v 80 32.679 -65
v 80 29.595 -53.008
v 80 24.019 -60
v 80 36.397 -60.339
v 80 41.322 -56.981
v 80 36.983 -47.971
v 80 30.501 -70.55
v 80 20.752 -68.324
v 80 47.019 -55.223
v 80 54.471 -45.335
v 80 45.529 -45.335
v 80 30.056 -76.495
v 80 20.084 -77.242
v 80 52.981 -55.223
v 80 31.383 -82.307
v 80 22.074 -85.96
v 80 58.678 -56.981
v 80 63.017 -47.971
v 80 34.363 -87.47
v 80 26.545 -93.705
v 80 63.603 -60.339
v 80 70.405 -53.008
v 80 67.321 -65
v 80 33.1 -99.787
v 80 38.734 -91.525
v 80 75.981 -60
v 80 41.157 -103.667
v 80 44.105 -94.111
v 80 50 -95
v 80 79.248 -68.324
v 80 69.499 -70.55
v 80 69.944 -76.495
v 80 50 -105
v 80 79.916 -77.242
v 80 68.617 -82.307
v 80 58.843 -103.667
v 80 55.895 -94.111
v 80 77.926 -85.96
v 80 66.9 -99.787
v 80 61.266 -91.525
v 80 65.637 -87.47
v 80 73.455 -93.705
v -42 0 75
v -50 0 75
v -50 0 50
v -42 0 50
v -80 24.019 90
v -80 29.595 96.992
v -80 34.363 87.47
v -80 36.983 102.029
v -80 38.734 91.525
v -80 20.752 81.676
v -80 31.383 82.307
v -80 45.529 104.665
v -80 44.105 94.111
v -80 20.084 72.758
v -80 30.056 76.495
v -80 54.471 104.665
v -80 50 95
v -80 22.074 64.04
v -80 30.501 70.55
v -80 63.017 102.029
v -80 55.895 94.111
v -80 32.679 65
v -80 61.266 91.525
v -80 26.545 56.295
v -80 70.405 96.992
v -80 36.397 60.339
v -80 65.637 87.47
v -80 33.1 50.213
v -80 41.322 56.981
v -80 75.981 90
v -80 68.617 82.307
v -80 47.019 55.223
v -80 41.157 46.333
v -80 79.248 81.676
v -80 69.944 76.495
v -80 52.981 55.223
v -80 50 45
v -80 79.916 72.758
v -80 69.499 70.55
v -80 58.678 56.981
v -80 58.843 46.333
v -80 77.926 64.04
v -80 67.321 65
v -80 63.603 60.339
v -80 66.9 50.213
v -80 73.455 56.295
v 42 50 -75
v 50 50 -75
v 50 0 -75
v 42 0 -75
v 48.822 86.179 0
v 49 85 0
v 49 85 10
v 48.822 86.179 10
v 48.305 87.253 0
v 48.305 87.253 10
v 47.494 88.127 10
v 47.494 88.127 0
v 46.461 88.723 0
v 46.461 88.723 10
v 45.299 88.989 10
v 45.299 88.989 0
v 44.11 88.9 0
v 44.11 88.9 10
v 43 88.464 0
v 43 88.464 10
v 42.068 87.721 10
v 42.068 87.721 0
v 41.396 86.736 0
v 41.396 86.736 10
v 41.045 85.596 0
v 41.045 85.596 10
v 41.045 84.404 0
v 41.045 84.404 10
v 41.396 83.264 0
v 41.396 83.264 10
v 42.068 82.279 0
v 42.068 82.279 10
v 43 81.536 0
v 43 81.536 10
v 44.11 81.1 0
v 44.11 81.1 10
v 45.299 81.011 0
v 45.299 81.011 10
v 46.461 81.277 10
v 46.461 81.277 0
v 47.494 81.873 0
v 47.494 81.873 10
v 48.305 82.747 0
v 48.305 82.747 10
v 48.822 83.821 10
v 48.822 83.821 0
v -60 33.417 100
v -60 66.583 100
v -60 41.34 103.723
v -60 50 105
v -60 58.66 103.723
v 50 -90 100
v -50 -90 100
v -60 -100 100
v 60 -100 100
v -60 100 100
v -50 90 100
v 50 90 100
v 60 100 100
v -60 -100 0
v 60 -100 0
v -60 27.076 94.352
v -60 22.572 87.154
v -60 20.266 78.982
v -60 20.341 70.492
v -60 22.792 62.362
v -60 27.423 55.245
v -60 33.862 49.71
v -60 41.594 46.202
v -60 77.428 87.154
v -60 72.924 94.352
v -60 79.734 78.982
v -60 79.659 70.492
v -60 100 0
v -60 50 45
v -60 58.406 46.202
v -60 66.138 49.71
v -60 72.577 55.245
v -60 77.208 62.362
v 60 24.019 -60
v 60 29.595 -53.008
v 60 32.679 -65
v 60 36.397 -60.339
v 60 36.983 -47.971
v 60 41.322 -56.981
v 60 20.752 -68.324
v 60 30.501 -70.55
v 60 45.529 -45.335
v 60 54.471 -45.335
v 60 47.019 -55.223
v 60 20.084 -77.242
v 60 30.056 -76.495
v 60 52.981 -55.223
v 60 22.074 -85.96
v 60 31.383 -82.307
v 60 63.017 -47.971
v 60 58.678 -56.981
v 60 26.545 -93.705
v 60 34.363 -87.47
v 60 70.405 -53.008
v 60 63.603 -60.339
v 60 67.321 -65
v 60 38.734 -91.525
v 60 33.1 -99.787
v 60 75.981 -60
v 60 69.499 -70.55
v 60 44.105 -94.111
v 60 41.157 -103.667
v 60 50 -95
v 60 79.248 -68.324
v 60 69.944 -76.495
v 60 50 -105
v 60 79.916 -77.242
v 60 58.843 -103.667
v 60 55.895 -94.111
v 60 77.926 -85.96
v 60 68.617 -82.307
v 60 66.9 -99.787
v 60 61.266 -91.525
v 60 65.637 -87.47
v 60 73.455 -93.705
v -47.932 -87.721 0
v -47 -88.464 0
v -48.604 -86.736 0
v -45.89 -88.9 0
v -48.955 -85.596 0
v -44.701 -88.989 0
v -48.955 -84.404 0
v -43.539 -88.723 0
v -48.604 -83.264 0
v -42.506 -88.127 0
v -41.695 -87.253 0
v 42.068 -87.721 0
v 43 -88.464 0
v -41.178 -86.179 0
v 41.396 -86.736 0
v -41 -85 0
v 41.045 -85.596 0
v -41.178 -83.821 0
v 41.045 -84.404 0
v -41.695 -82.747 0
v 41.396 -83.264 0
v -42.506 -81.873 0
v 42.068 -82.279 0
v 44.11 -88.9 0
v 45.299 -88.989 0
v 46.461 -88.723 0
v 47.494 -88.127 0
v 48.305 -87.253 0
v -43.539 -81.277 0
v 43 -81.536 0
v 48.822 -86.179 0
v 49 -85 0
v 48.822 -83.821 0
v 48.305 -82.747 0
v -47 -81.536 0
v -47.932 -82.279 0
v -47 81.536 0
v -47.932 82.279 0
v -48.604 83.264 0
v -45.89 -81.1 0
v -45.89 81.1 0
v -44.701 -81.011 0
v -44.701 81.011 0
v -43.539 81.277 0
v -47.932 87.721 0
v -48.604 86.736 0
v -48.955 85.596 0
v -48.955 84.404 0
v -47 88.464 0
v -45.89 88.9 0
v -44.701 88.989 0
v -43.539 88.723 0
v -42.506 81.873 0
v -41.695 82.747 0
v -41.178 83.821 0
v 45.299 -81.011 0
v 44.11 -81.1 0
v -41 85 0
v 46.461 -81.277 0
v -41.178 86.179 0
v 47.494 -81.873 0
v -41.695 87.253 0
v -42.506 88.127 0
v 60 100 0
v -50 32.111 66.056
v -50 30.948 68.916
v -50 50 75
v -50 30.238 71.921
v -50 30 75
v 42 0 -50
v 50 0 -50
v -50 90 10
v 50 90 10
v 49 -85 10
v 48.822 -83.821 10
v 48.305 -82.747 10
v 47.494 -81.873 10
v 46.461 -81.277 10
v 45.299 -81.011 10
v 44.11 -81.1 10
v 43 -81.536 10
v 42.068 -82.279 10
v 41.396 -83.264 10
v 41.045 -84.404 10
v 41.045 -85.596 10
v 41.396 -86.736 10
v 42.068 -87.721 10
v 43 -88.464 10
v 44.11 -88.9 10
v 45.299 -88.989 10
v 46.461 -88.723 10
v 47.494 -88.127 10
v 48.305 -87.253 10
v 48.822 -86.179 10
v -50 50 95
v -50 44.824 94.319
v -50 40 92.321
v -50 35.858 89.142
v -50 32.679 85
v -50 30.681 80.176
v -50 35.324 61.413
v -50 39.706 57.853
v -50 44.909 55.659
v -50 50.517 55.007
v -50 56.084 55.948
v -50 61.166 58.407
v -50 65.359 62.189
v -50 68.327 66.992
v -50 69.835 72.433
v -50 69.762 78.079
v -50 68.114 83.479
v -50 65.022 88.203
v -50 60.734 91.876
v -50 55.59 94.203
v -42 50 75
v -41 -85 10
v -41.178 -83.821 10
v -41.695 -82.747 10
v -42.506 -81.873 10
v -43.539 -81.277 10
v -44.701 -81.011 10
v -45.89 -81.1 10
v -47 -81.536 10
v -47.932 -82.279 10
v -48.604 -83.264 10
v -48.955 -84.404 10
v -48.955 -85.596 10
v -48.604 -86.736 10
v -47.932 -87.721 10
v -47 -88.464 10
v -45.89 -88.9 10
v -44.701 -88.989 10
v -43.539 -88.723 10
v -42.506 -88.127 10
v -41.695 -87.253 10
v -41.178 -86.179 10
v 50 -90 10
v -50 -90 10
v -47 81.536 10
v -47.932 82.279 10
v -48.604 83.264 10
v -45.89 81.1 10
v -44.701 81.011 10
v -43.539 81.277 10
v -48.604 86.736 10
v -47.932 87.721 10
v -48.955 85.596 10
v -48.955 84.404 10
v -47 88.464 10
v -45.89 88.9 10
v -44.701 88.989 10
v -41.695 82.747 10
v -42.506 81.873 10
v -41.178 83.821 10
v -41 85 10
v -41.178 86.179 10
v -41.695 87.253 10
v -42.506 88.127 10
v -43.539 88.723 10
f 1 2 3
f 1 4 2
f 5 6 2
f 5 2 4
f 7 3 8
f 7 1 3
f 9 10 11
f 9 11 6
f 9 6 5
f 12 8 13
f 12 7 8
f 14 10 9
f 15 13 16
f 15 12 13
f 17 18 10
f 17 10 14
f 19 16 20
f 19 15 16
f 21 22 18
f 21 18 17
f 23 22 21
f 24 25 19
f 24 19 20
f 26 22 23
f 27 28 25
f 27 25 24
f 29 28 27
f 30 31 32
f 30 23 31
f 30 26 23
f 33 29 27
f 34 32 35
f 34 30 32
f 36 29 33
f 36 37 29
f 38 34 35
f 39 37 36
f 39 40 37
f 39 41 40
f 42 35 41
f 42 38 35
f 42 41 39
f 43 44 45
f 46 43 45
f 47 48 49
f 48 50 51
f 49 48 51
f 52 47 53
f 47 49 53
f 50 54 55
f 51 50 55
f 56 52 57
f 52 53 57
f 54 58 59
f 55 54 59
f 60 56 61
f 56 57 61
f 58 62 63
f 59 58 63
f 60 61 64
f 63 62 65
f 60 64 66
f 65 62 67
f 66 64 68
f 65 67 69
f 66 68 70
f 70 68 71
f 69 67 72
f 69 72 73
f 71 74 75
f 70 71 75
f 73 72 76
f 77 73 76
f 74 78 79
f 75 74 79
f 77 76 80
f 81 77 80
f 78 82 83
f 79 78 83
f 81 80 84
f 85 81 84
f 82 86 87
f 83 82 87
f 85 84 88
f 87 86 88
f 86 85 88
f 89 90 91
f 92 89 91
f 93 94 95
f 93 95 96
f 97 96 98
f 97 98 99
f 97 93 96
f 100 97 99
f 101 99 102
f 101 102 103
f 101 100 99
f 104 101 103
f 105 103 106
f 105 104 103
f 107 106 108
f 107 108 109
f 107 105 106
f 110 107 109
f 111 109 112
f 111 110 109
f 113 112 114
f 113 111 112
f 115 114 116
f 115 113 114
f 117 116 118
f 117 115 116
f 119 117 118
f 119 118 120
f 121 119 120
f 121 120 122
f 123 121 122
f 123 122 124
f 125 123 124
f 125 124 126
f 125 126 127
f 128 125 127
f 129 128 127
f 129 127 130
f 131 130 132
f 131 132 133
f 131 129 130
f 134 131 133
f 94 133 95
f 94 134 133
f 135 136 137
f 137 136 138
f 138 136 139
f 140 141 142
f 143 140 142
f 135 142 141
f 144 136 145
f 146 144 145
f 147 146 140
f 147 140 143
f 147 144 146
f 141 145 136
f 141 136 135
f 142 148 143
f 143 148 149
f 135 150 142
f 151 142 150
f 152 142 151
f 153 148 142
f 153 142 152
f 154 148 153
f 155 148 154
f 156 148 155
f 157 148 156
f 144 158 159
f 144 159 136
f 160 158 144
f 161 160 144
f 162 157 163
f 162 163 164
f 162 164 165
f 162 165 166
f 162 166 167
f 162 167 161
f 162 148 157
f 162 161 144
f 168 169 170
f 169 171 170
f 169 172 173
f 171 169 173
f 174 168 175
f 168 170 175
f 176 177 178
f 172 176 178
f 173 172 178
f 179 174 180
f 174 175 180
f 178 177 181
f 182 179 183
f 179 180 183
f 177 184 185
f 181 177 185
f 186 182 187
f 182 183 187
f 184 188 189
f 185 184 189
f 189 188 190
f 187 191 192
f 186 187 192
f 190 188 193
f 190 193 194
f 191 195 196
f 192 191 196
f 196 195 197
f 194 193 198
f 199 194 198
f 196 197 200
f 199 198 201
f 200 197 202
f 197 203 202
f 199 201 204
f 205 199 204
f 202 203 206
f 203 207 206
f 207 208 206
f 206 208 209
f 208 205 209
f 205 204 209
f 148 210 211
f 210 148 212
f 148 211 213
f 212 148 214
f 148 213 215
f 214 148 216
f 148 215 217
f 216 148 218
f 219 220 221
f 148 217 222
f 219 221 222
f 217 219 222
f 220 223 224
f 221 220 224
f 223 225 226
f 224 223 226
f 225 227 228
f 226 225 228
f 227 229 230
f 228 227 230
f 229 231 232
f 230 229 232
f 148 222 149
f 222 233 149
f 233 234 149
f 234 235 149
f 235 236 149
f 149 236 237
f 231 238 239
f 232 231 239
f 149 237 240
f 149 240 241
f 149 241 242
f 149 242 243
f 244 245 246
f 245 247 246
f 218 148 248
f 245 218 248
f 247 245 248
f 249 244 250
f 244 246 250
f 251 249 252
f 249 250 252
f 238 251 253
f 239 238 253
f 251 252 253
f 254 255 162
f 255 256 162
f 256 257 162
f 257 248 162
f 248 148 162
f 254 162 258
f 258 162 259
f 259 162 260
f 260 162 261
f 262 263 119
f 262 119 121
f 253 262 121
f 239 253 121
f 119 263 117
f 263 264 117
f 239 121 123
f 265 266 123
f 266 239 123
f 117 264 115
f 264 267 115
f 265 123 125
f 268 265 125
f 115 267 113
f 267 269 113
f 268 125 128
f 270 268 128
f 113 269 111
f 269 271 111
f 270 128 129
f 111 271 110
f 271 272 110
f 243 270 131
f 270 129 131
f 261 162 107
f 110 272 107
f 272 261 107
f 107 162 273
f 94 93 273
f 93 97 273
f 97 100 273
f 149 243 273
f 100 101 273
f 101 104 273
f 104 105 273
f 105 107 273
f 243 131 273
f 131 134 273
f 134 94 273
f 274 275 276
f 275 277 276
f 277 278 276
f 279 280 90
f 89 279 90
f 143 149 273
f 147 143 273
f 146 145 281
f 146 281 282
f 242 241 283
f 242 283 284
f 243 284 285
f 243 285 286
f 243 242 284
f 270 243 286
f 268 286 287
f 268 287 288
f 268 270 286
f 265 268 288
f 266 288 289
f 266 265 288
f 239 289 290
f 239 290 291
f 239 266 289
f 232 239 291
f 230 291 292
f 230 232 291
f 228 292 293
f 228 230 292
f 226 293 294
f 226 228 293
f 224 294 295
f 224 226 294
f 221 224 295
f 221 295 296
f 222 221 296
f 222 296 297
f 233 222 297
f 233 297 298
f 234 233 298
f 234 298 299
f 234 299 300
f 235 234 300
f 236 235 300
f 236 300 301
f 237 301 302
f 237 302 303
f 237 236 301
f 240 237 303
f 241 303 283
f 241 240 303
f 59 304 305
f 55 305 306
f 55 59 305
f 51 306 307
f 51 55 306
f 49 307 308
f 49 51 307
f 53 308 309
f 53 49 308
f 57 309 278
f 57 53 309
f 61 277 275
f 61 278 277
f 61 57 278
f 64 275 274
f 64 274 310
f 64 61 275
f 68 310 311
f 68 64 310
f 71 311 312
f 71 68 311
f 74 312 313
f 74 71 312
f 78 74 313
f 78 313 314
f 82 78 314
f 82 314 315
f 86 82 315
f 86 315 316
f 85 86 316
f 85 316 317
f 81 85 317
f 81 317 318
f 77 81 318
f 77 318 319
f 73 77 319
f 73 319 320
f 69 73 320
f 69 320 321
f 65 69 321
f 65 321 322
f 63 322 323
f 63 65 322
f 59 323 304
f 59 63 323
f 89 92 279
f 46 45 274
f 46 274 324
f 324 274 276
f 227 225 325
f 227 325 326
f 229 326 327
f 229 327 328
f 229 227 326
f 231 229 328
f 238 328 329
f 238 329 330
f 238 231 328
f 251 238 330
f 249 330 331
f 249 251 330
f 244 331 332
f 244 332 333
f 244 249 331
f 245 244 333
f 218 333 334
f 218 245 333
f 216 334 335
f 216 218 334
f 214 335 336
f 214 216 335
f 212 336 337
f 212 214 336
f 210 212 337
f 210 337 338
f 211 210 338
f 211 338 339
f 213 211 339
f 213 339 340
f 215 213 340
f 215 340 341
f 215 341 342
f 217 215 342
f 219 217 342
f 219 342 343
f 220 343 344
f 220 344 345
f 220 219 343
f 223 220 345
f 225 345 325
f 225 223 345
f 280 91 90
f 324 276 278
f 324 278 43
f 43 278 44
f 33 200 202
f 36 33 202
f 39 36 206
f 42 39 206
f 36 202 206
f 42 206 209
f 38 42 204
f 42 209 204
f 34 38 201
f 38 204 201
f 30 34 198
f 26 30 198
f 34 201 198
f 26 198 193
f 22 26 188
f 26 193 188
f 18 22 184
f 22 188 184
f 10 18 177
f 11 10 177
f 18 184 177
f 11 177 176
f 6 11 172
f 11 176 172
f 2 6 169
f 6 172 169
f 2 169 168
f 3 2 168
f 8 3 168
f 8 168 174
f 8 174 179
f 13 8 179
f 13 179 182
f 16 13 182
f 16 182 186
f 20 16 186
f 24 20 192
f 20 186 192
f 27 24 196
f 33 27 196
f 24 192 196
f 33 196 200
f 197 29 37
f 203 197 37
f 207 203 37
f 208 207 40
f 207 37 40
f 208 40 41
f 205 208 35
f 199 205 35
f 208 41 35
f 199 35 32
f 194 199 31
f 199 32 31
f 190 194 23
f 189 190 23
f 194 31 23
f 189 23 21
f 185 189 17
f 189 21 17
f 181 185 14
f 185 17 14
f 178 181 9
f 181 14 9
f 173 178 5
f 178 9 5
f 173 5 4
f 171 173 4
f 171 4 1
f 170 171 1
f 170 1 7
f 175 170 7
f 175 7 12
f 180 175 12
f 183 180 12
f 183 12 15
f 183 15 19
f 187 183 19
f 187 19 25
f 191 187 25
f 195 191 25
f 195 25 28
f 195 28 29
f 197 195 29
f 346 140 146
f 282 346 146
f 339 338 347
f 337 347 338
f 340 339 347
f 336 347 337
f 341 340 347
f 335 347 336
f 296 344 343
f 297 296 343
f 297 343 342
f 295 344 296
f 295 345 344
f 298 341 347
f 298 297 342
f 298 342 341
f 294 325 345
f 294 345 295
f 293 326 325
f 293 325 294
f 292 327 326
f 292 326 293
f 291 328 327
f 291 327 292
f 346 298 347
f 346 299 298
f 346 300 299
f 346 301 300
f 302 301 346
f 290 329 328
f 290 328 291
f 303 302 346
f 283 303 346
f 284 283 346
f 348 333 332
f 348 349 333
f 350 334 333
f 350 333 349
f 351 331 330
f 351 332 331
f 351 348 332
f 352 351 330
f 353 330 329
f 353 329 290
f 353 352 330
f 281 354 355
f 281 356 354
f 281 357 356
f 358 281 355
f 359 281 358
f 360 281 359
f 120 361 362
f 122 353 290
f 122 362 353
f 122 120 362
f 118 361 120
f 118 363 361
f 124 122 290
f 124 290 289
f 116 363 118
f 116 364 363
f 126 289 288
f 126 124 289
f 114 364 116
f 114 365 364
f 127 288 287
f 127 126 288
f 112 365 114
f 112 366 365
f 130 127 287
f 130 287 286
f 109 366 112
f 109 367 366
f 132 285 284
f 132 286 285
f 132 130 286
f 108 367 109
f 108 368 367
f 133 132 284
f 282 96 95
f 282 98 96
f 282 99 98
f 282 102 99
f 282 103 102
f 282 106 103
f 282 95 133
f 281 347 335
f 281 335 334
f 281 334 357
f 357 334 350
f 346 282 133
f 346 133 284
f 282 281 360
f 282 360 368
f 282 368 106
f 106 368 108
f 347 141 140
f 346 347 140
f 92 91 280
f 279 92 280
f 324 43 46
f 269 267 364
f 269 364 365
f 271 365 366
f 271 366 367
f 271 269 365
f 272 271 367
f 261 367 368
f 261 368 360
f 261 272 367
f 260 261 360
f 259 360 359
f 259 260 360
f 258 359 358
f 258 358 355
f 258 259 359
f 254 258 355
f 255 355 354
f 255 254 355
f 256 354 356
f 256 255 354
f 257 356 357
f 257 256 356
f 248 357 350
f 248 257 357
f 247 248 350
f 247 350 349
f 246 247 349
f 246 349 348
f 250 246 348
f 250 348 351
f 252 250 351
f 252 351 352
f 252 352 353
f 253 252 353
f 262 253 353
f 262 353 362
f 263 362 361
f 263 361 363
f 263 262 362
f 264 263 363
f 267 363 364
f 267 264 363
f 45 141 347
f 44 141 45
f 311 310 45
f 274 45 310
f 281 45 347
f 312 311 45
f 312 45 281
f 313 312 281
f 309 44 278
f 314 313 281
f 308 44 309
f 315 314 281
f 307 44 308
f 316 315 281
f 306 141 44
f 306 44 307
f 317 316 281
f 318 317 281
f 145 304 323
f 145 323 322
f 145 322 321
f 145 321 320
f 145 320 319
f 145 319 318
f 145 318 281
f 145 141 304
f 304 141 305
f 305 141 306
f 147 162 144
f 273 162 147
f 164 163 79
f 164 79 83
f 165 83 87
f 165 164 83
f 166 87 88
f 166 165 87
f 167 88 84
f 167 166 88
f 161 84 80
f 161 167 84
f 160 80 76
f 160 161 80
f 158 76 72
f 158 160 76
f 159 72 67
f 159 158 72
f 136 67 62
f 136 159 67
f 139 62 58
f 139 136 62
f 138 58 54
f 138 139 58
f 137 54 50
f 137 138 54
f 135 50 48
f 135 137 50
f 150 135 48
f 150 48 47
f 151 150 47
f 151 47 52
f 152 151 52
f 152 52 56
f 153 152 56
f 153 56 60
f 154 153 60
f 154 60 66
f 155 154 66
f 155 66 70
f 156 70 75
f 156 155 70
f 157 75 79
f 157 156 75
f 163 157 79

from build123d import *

# Parameters (mm, degrees)
SKETCH1_W           = 120
SKETCH1_H           = 200
BOSS_EXTRUDE1_DEPTH = 100
SKETCH2_W           = 100
SKETCH2_H           = 180
CUT_EXTRUDE1_DEPTH  = 90
SKETCH3_R           = 30
BOSS_EXTRUDE2_DEPTH = 20
SKETCH4_R           = 30
BOSS_EXTRUDE3_DEPTH = 20
SKETCH5_R           = 20
CUT_EXTRUDE2_DEPTH  = 40
SKETCH6_R           = 20
CUT_EXTRUDE3_DEPTH  = 40
BOSS_EXTRUDE4_DEPTH = 8
BOSS_EXTRUDE5_DEPTH = 8
SKETCH9_R           = 4
CUT_EXTRUDE4_DEPTH  = 10


with BuildPart() as part:
    # Sketch1 → Boss-Extrude1 (new body)
    with BuildSketch(Plane.XY):
        Rectangle(SKETCH1_W, SKETCH1_H)
    extrude(amount=BOSS_EXTRUDE1_DEPTH)

    # Sketch2 → Cut-Extrude1 (cut)
    with BuildSketch(Plane.XY.offset(100)):
        Rectangle(SKETCH2_W, SKETCH2_H)
    extrude(amount=-CUT_EXTRUDE1_DEPTH, mode=Mode.SUBTRACT)

    # Sketch3 → Boss-Extrude2 (add)
    with BuildSketch(Plane(origin=(-60, 0, 0), x_dir=(0, 0, -1), z_dir=(1, 0, 0))):
        with Locations((-75, 50)):
            Circle(SKETCH3_R)
    extrude(amount=-BOSS_EXTRUDE2_DEPTH)

    # Sketch5 → Cut-Extrude2 (cut)
    with BuildSketch(Plane(origin=(-80, 0, 0), x_dir=(0, 0, -1), z_dir=(1, 0, 0))):
        with Locations((-75, 50)):
            Circle(SKETCH5_R)
    extrude(amount=CUT_EXTRUDE2_DEPTH, mode=Mode.SUBTRACT)

    # Sketch7 → Boss-Extrude4 (add)
    with BuildSketch(Plane(origin=(-50, 0, 0), x_dir=(0, 0, -1), z_dir=(1, 0, 0))):
        Polygon((-75, 50), (-75, 0), (-50, 0), align=None)
    extrude(amount=BOSS_EXTRUDE4_DEPTH)

    # Sketch9 → Cut-Extrude4 (cut)
    with BuildSketch(Plane.XY):
        with Locations((45, 85)):
            Circle(SKETCH9_R)
        with Locations((-45, 85)):
            Circle(SKETCH9_R)
        with Locations((45, -85)):
            Circle(SKETCH9_R)
        with Locations((-45, -85)):
            Circle(SKETCH9_R)
    extrude(amount=CUT_EXTRUDE4_DEPTH, mode=Mode.SUBTRACT)


with BuildPart() as body_2:
    # Sketch4 → Boss-Extrude3 (new body)
    with BuildSketch(Plane(origin=(60, 0, 0), x_dir=(0, 0, -1), z_dir=(1, 0, 0))):
        with Locations((75, 50)):
            Circle(SKETCH4_R)
    extrude(amount=BOSS_EXTRUDE3_DEPTH)

    # Sketch6 → Cut-Extrude3 (cut)
    with BuildSketch(Plane(origin=(80, 0, 0), x_dir=(0, 0, -1), z_dir=(1, 0, 0))):
        with Locations((75, 50)):
            Circle(SKETCH6_R)
    extrude(amount=-CUT_EXTRUDE3_DEPTH, mode=Mode.SUBTRACT)


with BuildPart() as body_3:
    # Sketch8 → Boss-Extrude5 (new body)
    with BuildSketch(Plane(origin=(50, 0, 0), x_dir=(0, 0, -1), z_dir=(1, 0, 0))):
        Polygon((75, 50), (75, 0), (50, 0), align=None)
    extrude(amount=-BOSS_EXTRUDE5_DEPTH)


solid = Compound([part.part, body_2.part, body_3.part])
